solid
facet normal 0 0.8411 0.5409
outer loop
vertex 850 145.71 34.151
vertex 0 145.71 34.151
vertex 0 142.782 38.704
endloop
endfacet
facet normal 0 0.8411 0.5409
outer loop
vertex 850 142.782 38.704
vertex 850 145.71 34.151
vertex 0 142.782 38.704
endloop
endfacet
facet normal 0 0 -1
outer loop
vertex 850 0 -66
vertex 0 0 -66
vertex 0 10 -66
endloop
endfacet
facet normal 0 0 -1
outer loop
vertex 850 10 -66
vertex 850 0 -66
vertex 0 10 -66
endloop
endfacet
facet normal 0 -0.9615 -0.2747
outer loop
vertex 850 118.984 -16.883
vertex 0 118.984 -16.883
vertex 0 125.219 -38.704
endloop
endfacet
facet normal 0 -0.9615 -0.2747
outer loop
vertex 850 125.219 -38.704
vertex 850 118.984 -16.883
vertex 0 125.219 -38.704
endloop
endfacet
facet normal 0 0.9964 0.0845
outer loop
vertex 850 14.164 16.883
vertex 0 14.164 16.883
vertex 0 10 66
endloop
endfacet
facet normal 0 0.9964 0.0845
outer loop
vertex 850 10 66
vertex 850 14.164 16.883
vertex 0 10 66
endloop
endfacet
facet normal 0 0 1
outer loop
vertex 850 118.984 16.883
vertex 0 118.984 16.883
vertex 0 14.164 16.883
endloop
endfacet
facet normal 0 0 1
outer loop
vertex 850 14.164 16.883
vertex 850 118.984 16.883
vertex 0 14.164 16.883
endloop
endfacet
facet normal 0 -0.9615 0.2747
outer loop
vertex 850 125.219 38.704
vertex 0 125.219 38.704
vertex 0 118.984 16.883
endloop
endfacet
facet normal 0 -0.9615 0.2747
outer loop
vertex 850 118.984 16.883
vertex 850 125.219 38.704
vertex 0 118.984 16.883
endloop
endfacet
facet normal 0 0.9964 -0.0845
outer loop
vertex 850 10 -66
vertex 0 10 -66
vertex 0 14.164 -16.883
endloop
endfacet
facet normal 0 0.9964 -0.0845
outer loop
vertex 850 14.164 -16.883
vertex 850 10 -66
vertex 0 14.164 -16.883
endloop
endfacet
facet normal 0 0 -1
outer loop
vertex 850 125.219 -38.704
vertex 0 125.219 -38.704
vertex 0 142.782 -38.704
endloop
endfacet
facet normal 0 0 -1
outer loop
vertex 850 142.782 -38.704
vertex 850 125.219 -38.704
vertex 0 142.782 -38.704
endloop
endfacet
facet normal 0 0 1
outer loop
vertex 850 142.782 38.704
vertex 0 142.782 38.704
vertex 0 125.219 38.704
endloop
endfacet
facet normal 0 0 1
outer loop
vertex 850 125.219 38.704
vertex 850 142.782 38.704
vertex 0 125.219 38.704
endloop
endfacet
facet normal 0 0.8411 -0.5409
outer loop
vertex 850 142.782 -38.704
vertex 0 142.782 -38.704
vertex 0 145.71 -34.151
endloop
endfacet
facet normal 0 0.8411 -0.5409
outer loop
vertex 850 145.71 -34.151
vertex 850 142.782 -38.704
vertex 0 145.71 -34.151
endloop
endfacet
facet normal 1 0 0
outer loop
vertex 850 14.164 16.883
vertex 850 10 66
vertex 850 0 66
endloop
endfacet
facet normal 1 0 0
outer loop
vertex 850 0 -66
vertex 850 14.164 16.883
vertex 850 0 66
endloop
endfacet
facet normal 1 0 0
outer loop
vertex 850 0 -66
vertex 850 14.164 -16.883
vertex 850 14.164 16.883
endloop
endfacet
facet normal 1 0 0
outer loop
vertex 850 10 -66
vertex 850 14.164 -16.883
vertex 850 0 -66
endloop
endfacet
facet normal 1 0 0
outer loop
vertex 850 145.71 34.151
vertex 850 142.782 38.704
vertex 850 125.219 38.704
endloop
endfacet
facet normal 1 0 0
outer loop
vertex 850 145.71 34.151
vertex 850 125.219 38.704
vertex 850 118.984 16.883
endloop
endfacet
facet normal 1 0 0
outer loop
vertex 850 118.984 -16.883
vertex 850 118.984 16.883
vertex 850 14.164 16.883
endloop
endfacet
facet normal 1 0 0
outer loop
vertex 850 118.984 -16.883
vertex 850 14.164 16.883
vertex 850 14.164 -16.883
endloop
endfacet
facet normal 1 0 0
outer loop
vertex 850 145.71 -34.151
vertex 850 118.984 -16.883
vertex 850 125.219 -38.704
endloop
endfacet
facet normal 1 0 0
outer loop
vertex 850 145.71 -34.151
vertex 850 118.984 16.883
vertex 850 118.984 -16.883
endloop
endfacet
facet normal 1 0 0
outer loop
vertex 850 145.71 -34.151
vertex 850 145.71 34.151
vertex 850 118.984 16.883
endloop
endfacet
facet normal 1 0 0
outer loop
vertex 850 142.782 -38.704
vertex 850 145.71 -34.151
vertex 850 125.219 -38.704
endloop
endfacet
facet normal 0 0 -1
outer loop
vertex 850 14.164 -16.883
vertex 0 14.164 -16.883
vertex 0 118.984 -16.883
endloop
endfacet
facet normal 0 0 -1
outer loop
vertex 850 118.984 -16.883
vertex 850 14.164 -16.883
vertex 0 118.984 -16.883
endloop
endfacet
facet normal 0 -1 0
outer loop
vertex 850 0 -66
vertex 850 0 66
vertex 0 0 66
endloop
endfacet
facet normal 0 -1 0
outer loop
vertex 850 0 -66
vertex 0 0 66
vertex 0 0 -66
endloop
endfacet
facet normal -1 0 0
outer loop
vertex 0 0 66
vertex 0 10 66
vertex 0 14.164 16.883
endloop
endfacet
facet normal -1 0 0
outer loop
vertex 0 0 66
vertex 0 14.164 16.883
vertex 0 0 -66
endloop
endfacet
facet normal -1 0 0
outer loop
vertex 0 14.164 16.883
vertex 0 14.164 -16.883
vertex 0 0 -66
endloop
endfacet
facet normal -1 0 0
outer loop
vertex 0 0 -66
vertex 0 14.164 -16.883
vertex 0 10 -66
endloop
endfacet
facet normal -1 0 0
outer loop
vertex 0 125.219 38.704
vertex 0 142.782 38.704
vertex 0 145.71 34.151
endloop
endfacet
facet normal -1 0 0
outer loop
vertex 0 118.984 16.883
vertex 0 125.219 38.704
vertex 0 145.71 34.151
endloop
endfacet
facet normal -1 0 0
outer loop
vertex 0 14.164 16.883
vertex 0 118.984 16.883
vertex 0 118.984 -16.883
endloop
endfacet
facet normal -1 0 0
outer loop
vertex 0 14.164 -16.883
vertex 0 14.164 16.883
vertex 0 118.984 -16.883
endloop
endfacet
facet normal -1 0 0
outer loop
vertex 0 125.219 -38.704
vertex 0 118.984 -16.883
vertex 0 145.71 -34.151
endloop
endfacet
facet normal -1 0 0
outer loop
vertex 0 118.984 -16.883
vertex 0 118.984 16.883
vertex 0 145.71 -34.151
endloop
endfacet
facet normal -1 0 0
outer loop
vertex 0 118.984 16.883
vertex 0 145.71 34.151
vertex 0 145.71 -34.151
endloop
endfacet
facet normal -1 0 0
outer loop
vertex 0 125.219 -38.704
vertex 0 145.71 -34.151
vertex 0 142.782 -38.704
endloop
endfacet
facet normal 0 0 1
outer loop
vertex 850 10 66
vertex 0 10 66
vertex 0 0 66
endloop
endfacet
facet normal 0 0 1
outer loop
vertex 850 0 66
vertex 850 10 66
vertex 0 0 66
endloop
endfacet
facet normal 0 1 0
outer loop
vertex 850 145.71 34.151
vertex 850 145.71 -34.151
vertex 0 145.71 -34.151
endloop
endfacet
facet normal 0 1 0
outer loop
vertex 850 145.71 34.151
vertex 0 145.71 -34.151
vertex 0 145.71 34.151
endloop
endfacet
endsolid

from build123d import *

# Parameters (mm, degrees)
EXTRUDE_1_DEPTH = 850


with BuildPart() as part:
    # Эскиз1 → Бобышка-Вытянуть1 (new body)
    with BuildSketch(Plane(origin=(0, 0, 0), x_dir=(0, 0, -1), z_dir=(1, 0, 0))):
        Polygon((-66, 0), (66, 0), (66, 10), (16.883336969, 14.163502235), (16.883336969, 118.984443331), (38.704461372, 125.219050303), (38.704461372, 142.782419329), (34.150995328, 145.7096475), (-34.150995328, 145.7096475), (-38.704461372, 142.782419329), (-38.704461372, 125.219050303), (-16.883336969, 118.984443331), (-16.883336969, 14.163502235), (-66, 10), align=None)
    extrude(amount=EXTRUDE_1_DEPTH)


solid = part.part
